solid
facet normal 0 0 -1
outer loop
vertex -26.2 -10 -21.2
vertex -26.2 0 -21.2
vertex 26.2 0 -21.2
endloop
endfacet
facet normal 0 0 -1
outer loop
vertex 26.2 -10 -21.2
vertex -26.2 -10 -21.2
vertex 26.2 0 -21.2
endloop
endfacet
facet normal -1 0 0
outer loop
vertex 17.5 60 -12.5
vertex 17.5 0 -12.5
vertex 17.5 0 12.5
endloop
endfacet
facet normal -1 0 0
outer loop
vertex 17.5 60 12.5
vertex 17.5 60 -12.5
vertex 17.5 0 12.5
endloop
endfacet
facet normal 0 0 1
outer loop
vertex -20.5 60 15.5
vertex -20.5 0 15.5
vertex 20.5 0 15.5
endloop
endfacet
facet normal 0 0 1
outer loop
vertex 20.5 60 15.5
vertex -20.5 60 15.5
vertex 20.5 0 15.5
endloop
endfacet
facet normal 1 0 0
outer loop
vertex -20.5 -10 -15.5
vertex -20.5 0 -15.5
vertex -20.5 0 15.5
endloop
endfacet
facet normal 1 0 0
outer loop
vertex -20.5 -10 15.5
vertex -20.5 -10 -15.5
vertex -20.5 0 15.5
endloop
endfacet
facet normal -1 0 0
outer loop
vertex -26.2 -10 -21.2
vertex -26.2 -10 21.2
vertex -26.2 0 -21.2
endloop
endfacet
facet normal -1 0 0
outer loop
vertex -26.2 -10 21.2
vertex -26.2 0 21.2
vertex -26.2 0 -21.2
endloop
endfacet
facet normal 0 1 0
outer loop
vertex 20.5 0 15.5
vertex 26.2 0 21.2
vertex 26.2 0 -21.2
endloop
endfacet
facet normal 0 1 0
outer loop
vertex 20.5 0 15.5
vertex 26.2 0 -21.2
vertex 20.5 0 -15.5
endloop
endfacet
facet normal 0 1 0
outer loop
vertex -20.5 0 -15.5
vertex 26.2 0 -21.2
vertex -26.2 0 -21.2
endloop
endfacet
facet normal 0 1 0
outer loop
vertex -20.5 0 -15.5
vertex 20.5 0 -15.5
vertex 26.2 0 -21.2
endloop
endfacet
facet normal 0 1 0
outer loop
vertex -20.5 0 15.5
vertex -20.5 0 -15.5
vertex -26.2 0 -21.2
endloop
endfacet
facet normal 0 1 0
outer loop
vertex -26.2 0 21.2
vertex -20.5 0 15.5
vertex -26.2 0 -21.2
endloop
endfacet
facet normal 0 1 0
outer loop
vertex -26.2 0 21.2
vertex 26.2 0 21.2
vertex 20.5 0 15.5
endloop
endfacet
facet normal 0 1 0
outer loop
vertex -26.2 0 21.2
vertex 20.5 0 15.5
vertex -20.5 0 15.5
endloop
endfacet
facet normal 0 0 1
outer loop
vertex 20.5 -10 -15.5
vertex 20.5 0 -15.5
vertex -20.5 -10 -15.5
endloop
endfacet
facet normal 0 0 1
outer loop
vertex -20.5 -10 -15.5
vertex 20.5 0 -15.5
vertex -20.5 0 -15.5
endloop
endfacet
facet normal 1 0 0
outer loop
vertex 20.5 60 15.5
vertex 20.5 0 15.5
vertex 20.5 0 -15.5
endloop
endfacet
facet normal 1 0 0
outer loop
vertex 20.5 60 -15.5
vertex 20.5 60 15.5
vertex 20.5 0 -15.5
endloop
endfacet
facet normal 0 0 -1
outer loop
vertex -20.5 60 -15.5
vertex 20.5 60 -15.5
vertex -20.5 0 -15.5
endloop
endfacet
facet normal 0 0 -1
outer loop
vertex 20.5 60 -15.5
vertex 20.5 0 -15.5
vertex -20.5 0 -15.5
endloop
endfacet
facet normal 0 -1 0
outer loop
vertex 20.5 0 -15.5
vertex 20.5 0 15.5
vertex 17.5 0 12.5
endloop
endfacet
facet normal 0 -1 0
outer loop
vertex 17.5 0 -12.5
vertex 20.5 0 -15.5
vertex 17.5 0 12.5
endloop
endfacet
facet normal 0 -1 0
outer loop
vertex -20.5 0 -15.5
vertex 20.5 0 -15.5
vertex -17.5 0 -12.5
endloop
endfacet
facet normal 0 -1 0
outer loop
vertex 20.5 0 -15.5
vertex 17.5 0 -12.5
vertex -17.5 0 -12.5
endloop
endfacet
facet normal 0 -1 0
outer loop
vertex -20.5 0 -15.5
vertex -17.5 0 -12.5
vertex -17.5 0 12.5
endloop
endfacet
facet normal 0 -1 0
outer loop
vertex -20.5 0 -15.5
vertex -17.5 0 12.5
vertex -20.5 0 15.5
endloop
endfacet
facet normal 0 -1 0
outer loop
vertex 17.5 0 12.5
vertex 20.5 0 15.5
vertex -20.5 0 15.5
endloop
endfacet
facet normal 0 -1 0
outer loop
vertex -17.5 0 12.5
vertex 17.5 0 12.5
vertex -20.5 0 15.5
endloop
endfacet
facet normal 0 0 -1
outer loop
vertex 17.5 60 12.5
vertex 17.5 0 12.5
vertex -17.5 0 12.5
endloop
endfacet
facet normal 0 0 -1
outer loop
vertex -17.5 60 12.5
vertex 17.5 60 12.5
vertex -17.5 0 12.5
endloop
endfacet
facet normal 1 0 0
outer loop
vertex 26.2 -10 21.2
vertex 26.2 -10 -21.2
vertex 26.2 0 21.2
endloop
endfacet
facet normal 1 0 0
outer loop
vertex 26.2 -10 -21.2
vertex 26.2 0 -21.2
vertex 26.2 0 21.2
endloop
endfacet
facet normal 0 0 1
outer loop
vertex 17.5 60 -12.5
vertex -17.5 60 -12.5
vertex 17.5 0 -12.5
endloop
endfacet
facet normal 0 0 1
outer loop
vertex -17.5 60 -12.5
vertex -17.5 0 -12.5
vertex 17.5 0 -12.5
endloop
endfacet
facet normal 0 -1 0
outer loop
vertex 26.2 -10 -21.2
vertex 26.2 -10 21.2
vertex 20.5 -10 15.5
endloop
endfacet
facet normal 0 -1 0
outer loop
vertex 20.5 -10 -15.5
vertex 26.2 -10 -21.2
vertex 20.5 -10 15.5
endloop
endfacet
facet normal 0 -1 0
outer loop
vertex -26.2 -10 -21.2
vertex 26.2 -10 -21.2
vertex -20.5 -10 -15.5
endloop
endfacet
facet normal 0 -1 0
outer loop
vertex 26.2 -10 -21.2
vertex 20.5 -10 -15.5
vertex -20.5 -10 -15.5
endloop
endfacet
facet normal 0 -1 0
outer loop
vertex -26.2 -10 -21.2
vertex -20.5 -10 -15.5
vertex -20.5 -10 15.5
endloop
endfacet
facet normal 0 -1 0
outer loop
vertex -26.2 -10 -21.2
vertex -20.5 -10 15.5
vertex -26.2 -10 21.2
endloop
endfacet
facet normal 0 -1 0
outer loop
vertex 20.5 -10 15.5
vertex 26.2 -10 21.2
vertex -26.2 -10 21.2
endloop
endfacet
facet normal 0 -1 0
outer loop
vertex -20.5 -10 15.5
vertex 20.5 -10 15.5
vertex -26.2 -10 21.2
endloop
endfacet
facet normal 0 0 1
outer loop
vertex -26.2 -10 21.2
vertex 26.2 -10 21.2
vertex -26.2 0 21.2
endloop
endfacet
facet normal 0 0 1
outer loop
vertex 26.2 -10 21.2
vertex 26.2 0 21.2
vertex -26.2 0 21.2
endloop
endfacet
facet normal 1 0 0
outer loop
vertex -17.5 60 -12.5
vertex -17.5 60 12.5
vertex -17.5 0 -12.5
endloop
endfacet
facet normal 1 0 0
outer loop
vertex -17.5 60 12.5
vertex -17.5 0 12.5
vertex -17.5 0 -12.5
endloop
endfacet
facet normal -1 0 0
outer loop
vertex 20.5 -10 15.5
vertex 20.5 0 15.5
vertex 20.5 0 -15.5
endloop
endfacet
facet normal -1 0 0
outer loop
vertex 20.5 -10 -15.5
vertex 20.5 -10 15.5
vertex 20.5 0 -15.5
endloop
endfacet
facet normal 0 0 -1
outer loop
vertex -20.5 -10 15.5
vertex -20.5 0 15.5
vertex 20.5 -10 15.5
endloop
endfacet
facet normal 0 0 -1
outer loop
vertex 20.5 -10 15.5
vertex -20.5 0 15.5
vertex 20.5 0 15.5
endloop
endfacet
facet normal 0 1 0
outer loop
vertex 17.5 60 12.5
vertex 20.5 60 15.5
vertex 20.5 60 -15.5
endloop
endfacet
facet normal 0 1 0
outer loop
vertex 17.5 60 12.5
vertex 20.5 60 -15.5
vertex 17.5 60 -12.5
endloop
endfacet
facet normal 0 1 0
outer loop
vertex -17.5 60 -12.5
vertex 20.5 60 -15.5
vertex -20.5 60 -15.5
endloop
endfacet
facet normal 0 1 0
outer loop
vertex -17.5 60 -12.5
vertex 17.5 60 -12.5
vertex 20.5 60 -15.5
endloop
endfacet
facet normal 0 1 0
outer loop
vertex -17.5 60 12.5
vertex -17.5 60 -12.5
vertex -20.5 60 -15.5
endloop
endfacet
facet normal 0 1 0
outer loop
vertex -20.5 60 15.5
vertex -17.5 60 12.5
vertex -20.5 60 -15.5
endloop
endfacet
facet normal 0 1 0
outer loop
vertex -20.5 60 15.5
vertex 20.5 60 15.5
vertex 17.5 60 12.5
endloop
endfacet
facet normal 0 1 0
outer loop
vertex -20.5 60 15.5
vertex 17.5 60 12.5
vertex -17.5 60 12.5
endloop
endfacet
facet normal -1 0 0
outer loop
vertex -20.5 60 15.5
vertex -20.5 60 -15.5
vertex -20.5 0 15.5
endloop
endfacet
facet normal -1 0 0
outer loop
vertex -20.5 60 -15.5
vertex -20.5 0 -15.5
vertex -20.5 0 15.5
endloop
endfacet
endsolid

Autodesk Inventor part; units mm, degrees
ref_plane "YZ Plane" through (0, 0, 0) normal (1, 0, 0) x (0, 1, 0)
ref_plane "XZ Plane" through (0, 0, 0) normal (0, 1, 0) x (-1, 0, 0)
ref_plane "XY Plane" through (0, 0, 0) normal (0, 0, 1) x (1, 0, 0)
sketch "Sketch1" plane through (0, 0, 0) normal (0, 1, 0) x (-1, 0, 0)
  line L0 (-17.5, 12.5) -> (17.5, 12.5)
  line L1 (17.5, 12.5) -> (17.5, -12.5)
  line L2 (17.5, -12.5) -> (-17.5, -12.5)
  line L3 (-17.5, -12.5) -> (-17.5, 12.5)
  line L4 (-17.5, 12.5) -> (17.5, -12.5) construction
  line L5 (17.5, 12.5) -> (-17.5, -12.5) construction
  line L6 (26.2, -21.2) -> (-26.2, -21.2)
  line L7 (-26.2, -21.2) -> (-26.2, 21.2)
  line L8 (-26.2, 21.2) -> (26.2, 21.2)
  line L9 (26.2, 21.2) -> (26.2, -21.2)
  line L10 (26.2, -21.2) -> (-26.2, 21.2) construction
  line L11 (-26.2, -21.2) -> (26.2, 21.2) construction
  line L12 (20.5, 15.5) -> (-20.5, 15.5)
  line L13 (-20.5, 15.5) -> (-20.5, -15.5)
  line L14 (-20.5, -15.5) -> (20.5, -15.5)
  line L15 (20.5, -15.5) -> (20.5, 15.5)
  point P0 (0, 0)
  dimension "d0" = 35
  dimension "d1" = 25
  dimension "d2" = 52.4
  dimension "d3" = 42.4
  dimension "d4" = 3
extrude "Extrusion1" add sketch "Sketch1" along normal blind 60 contours L15 L14 L13 L12
extrude "Extrusion2" add sketch "Sketch1" against normal blind 10 contours L6 L7 L8 L9
sketch "Sketch2" plane through (0, -10, 0) normal (0, -1, 0) x (1, 0, 0)
  circle A0 centre (23.5, -18.5) radius 1.5
  line L0 (20.5, 15.5) -> (20.5, -15.5) projected
  line L1 (-20.5, 15.5) -> (20.5, 15.5) projected
  line L2 (-20.5, -15.5) -> (-20.5, 15.5) projected
  line L3 (20.5, -15.5) -> (-20.5, -15.5) projected
  line L4 (17.5, 12.5) -> (-17.5, 12.5) projected
  line L5 (17.5, -12.5) -> (17.5, 12.5) projected
  line L6 (-17.5, -12.5) -> (17.5, -12.5) projected
  line L7 (-17.5, 12.5) -> (-17.5, -12.5) projected
  line L8 (-23.5, -18.5) -> (-23.5, 18.5) construction
  line L9 (-23.5, 18.5) -> (23.5, 18.5) construction
  line L10 (23.5, 18.5) -> (23.5, -18.5) construction
  line L11 (23.5, -18.5) -> (-23.5, -18.5) construction
  circle A1 centre (23.5, 18.5) radius 1.5
  circle A2 centre (-23.5, 18.5) radius 1.5
  circle A3 centre (-23.5, -18.5) radius 1.5
  point P0 (0, 0)
  dimension "d9" = 3
  dimension "d10" = 3
  dimension "d11" = 3
  dimension "d12" = 3
  dimension "d13" = 3
